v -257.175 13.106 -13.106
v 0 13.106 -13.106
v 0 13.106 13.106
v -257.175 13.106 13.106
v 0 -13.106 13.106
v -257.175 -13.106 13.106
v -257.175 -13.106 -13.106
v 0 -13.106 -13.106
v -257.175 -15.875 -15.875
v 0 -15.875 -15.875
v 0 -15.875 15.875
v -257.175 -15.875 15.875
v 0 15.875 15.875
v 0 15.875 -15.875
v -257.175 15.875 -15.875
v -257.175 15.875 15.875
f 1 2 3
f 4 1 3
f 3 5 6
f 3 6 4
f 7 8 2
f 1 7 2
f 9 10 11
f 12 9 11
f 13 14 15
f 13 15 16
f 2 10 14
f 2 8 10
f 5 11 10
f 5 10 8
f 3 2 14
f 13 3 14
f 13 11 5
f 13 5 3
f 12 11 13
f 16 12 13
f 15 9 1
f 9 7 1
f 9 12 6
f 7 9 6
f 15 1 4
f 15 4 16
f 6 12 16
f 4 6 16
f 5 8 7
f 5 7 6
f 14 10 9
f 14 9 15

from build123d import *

# Parameters (mm, degrees)
SKETCH_W   = 31.75
SKETCH_H   = 31.75
SKETCH_W_2 = 26.2128
SKETCH_H_2 = 26.2128
PAD_DEPTH  = 257.175


with BuildPart() as part:
    # Sketch → Pad (new body)
    with BuildSketch(Plane.YZ):
        Rectangle(SKETCH_W, SKETCH_H)
        Rectangle(SKETCH_W_2, SKETCH_H_2, mode=Mode.SUBTRACT)
    extrude(amount=-PAD_DEPTH)


solid = part.part
